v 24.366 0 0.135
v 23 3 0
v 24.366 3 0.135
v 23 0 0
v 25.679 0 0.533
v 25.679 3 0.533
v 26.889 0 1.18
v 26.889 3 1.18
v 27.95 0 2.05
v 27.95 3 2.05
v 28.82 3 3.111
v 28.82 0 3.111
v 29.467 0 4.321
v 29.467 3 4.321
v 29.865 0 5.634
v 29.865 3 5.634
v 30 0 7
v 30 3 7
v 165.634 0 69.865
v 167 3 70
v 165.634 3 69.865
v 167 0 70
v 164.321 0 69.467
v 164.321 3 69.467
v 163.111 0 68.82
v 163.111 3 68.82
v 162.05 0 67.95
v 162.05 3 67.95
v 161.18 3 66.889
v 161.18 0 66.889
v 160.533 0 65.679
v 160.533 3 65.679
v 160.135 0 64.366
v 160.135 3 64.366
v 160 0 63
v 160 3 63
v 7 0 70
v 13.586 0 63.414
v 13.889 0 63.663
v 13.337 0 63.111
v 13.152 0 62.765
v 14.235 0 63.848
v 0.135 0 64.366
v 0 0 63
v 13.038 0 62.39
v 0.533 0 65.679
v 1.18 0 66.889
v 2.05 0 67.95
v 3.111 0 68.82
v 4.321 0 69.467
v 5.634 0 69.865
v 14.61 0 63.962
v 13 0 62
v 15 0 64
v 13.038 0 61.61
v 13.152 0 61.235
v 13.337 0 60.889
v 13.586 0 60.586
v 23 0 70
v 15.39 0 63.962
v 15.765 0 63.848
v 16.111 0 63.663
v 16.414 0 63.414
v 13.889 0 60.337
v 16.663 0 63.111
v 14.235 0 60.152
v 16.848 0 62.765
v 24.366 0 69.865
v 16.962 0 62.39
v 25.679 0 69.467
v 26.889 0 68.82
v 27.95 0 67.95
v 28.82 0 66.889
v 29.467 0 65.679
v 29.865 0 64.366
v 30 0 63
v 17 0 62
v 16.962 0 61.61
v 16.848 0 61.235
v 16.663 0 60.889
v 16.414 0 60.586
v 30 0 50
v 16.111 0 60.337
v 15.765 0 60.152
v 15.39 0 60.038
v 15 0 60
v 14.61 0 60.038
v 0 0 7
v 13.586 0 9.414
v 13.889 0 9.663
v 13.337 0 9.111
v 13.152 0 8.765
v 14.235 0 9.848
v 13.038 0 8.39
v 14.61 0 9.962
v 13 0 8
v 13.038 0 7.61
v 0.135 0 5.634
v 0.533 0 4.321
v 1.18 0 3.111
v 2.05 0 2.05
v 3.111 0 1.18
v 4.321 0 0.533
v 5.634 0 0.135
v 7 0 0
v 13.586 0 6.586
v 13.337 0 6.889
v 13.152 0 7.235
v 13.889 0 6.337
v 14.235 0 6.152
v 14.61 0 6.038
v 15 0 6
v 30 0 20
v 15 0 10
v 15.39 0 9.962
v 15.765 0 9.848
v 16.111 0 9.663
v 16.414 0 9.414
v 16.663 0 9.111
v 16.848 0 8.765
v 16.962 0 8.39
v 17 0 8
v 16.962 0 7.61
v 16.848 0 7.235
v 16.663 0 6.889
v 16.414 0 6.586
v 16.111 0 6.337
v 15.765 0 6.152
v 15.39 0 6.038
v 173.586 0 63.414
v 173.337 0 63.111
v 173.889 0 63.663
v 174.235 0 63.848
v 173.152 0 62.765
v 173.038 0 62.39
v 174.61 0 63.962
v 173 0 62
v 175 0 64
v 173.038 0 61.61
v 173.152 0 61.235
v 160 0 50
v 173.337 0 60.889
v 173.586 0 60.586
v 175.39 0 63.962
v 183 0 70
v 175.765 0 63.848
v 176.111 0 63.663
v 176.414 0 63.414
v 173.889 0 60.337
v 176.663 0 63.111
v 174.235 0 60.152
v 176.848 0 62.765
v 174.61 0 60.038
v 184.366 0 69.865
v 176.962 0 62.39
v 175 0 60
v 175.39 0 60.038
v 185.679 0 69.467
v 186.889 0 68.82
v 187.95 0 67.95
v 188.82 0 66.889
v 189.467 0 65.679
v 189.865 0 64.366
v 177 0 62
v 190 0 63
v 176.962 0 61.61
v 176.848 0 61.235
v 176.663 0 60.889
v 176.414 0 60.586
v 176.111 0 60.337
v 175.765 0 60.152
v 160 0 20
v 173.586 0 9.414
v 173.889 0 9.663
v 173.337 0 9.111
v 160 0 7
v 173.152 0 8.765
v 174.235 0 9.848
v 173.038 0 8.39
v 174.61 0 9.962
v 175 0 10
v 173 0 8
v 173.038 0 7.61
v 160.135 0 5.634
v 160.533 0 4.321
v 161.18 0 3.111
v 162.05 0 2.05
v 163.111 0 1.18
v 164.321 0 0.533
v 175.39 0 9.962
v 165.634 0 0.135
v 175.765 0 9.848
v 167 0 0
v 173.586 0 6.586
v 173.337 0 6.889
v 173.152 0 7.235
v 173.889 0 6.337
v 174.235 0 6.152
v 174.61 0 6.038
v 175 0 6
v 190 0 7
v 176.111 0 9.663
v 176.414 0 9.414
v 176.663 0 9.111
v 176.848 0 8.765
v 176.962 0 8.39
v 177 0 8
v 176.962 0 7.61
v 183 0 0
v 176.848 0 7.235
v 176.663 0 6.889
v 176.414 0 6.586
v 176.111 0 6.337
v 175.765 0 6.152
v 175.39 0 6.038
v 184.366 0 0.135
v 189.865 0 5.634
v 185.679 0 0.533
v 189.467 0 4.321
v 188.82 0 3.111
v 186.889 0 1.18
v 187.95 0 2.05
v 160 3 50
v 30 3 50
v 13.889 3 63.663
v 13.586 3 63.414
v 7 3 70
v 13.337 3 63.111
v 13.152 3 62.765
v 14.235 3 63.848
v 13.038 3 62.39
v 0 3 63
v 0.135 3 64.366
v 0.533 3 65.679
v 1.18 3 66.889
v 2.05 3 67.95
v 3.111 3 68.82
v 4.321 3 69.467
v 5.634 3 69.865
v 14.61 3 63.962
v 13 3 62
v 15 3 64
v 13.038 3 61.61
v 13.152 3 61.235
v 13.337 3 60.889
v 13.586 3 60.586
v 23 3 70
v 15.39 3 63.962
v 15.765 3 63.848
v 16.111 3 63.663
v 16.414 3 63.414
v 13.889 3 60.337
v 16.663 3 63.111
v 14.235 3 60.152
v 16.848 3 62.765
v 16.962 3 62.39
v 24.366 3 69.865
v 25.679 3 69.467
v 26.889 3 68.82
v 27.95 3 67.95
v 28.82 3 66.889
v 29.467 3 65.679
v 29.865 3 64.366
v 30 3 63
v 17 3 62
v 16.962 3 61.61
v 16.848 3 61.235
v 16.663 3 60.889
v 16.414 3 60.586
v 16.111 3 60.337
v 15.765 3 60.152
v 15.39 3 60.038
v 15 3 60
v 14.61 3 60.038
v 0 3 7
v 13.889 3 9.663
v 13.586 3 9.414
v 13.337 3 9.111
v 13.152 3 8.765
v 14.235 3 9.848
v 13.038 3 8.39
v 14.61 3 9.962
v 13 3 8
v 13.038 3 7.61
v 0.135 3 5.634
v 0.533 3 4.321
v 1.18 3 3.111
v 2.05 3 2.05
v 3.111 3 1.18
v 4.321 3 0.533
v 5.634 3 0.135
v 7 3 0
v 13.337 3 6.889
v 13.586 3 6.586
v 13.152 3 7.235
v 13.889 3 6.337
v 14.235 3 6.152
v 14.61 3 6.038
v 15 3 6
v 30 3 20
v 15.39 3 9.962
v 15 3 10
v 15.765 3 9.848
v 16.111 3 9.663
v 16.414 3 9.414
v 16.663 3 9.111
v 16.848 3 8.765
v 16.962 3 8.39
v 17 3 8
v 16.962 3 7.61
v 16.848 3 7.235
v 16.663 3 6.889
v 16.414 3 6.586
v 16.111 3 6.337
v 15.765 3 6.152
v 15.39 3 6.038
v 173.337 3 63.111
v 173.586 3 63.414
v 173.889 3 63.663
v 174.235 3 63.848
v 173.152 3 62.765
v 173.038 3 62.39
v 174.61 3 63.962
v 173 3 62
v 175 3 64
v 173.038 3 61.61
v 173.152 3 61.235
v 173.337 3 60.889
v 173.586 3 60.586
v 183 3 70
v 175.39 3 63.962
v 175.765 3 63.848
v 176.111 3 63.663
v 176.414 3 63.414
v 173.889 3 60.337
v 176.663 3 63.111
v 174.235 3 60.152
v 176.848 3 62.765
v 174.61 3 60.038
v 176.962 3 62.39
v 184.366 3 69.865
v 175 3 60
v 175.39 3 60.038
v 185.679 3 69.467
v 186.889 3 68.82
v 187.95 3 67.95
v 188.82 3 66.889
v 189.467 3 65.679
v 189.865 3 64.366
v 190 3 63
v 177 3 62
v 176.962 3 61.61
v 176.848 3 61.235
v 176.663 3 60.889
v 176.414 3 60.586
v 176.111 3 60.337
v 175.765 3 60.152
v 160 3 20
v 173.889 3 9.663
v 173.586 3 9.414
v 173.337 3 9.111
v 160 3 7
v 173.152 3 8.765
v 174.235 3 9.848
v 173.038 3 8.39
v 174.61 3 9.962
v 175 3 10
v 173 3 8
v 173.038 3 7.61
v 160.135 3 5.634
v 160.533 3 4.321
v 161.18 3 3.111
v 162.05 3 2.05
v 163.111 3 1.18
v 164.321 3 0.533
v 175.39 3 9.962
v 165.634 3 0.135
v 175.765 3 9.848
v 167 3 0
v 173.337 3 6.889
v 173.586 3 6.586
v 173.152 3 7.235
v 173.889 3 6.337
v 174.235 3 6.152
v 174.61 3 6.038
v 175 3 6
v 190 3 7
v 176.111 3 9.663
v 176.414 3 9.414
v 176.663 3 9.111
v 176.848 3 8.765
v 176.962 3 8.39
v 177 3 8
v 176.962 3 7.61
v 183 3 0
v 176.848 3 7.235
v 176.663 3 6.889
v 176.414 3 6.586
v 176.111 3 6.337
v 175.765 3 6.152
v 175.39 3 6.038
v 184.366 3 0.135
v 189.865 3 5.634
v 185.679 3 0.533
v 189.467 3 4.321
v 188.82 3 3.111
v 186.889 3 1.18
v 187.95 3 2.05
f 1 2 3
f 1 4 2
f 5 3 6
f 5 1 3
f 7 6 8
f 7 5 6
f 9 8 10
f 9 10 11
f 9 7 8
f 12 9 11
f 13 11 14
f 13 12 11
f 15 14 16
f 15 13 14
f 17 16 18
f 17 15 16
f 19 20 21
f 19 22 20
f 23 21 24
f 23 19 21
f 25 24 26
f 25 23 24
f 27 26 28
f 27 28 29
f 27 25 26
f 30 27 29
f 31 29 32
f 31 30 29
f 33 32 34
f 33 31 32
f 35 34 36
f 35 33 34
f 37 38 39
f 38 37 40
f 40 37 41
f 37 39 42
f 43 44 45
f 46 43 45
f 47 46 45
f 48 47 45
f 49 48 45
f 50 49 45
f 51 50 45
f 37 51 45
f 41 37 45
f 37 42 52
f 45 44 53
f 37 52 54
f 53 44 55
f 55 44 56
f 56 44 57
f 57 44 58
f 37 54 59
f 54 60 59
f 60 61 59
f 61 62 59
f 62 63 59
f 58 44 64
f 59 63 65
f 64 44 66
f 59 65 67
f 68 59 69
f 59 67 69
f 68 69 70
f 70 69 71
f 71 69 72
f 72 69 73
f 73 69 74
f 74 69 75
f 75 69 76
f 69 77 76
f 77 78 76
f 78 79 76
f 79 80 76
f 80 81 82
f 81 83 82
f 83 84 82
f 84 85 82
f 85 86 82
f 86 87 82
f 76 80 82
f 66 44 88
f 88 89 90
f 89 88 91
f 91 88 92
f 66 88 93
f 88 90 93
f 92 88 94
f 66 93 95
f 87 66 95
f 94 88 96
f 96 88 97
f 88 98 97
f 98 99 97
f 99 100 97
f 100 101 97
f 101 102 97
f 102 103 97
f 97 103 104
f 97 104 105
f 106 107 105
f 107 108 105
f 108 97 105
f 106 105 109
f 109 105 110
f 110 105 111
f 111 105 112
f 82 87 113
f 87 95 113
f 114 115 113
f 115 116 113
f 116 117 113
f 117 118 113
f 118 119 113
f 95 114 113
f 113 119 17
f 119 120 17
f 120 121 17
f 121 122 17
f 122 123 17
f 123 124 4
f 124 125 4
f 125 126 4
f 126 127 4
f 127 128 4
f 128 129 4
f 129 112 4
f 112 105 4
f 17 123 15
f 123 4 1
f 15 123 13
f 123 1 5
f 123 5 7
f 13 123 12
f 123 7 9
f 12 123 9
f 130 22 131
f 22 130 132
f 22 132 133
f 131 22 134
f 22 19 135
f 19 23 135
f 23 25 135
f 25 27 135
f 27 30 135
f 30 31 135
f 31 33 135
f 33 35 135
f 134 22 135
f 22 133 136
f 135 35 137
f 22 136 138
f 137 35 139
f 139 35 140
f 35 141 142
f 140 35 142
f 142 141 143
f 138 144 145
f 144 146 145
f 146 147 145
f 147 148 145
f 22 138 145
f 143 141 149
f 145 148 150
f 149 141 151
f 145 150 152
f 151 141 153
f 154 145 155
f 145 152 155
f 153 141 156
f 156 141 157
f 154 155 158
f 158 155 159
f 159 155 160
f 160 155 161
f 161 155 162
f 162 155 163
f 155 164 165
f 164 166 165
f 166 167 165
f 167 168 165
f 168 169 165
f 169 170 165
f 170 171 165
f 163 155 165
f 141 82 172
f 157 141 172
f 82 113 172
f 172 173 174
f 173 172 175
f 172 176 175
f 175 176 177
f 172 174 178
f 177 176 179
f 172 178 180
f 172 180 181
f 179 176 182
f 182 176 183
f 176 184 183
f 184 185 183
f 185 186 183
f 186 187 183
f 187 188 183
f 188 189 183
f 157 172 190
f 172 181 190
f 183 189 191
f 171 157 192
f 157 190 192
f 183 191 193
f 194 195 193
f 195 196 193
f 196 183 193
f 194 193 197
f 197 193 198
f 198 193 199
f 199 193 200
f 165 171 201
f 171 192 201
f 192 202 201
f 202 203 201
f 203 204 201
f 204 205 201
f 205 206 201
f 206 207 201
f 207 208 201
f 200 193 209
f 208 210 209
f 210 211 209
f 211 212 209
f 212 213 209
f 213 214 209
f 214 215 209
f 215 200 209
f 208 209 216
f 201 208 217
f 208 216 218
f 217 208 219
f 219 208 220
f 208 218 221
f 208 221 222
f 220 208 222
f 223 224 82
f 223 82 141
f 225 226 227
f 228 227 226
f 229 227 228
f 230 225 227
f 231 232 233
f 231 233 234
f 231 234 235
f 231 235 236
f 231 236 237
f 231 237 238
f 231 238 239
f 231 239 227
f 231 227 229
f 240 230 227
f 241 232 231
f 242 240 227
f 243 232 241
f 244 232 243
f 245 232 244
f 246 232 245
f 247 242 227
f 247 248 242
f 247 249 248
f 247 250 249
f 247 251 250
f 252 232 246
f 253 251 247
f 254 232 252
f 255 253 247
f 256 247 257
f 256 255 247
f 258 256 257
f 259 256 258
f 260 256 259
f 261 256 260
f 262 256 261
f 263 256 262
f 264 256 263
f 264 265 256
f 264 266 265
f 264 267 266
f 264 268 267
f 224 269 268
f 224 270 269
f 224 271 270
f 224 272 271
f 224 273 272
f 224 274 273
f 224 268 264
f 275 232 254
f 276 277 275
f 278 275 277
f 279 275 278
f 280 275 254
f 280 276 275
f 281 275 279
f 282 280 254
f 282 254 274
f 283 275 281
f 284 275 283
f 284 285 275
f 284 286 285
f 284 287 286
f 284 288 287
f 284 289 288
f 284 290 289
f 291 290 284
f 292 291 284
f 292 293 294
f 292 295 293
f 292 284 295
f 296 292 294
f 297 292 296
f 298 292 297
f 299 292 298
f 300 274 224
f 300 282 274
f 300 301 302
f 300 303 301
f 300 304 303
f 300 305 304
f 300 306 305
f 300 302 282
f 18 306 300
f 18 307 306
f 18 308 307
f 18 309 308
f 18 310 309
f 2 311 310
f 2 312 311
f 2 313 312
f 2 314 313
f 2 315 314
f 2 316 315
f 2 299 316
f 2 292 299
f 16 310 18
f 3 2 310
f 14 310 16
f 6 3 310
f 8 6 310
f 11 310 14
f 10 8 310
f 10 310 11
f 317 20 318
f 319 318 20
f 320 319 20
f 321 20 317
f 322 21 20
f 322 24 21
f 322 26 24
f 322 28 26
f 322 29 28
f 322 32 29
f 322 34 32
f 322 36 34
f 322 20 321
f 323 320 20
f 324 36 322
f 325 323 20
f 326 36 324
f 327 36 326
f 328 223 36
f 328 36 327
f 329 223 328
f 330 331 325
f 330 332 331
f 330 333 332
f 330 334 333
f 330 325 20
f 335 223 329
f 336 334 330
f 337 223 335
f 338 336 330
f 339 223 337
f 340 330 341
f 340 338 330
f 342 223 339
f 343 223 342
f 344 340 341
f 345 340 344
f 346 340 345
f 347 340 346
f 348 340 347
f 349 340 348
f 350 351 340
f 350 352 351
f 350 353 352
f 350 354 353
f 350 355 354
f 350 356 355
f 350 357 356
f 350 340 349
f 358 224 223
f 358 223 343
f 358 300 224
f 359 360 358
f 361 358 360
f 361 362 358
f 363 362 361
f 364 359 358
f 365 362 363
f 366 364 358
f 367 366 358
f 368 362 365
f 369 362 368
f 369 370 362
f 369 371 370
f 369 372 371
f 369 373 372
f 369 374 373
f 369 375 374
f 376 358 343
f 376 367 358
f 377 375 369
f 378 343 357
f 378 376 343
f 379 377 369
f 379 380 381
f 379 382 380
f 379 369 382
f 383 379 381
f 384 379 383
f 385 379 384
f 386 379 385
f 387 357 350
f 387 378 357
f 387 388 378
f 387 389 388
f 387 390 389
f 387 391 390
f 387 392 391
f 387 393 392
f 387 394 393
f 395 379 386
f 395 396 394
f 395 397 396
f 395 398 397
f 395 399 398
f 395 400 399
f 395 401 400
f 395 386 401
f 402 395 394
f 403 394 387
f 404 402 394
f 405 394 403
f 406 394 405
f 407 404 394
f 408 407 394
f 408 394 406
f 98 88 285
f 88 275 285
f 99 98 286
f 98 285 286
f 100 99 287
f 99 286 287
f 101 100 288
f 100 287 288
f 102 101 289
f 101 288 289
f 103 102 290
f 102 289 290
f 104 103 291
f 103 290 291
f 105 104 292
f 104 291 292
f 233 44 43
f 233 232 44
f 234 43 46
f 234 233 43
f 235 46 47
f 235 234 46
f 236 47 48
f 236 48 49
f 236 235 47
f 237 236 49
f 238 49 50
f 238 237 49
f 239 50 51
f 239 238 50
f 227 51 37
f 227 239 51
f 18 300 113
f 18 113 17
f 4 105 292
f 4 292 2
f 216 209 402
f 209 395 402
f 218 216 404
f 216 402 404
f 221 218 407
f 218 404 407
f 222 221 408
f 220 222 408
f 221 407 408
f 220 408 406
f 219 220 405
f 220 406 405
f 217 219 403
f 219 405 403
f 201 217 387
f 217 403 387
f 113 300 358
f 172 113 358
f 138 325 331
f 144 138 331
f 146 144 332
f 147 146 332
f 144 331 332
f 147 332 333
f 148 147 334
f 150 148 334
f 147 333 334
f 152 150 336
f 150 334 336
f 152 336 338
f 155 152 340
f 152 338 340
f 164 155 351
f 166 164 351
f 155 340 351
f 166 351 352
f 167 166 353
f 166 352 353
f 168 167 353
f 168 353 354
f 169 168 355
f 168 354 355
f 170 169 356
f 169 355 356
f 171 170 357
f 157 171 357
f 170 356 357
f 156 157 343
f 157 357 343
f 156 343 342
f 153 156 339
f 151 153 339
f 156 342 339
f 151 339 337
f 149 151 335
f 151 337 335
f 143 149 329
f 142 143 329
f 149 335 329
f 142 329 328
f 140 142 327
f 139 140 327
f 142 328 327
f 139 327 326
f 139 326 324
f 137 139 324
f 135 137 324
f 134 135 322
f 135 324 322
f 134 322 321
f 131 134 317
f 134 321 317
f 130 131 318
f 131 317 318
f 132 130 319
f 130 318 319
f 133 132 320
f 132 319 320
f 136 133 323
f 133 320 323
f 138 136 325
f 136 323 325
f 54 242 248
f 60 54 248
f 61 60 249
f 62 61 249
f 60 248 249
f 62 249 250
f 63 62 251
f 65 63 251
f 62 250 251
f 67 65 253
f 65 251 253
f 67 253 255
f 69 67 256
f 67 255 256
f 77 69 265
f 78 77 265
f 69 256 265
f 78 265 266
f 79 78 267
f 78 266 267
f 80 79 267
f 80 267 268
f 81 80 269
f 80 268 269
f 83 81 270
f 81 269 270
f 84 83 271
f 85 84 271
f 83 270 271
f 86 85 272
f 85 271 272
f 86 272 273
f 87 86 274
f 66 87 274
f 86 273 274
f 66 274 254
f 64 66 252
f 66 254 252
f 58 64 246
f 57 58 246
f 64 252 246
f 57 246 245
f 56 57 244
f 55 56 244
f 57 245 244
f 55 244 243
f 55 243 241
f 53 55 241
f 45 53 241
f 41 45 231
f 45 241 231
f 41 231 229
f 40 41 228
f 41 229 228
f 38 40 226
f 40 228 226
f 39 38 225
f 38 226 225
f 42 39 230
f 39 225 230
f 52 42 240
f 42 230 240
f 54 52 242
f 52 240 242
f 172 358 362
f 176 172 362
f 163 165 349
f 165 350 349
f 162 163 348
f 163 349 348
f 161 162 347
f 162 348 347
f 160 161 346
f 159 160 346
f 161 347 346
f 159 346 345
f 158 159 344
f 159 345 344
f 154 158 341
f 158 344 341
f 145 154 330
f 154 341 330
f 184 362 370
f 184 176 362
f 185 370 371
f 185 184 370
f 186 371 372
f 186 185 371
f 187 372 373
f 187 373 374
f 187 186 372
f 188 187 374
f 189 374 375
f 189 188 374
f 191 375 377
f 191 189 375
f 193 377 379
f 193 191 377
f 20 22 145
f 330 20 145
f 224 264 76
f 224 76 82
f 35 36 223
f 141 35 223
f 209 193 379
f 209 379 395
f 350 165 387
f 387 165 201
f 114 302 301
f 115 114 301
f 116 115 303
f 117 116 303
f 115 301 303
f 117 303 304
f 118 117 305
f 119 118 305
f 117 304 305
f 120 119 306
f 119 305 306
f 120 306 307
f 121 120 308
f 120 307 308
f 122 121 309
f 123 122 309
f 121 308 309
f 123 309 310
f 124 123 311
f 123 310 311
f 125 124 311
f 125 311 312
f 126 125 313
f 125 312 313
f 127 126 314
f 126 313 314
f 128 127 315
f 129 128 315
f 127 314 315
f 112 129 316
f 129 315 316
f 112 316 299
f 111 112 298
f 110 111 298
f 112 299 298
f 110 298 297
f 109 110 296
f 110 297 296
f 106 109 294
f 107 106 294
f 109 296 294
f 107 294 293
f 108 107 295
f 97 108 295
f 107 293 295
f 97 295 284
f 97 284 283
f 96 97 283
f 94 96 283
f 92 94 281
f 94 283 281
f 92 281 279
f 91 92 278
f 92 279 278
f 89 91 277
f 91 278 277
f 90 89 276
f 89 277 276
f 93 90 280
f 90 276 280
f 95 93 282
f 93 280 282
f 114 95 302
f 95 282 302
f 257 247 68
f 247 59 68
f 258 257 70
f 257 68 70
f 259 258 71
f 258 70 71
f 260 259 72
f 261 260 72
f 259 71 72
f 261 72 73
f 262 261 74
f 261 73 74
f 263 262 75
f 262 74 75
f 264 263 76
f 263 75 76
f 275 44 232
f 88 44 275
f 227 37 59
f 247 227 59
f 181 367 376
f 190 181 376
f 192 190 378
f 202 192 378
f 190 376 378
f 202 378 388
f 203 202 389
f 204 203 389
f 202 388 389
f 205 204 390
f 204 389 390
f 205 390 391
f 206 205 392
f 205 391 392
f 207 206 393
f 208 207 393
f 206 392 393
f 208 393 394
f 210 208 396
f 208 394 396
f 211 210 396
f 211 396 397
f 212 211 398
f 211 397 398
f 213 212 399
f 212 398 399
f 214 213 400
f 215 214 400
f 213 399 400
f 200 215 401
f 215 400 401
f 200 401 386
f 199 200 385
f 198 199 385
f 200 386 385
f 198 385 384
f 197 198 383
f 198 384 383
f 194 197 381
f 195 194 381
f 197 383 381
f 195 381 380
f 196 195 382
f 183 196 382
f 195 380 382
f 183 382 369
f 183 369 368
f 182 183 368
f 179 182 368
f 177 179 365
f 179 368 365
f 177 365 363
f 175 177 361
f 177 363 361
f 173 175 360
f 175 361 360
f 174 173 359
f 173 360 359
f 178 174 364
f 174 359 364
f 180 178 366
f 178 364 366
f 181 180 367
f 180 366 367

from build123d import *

# Parameters (mm, degrees)
CROQUIS1_W              = 190
CROQUIS1_H              = 70
SALIENTE_EXTRUIR1_DEPTH = 3
CROQUIS2_R              = 2
CROQUIS2_W              = 130
CROQUIS2_H              = 20
CORTAR_EXTRUIR1_DEPTH   = 3
REDONDEO1_R             = 7


with BuildPart() as part:
    # Croquis1 → Saliente-Extruir1 (new body)
    with BuildSketch(Plane(origin=(0, 0, 0), x_dir=(1, 0, 0), z_dir=(0, 1, 0))):
        with Locations((95, -35)):
            Rectangle(CROQUIS1_W, CROQUIS1_H)
    extrude(amount=SALIENTE_EXTRUIR1_DEPTH)

    # Croquis2 → Cortar-Extruir1 (cut)
    with BuildSketch(Plane(origin=(0, 3, 0), x_dir=(1, 0, 0), z_dir=(0, 1, 0))):
        with Locations(Location((15, -8, 0), (0, 0, 270))):
            Circle(CROQUIS2_R)
        with Locations(Location((175, -8, 0), (0, 0, 270))):
            Circle(CROQUIS2_R)
        with Locations(Location((175, -62, 0), (0, 0, 270))):
            Circle(CROQUIS2_R)
        with Locations(Location((15, -62, 0), (0, 0, 270))):
            Circle(CROQUIS2_R)
        with Locations((95, -10)):
            Rectangle(CROQUIS2_W, CROQUIS2_H)
        with Locations((95, -60)):
            Rectangle(CROQUIS2_W, CROQUIS2_H)
    extrude(amount=-CORTAR_EXTRUIR1_DEPTH, mode=Mode.SUBTRACT)

    # Redondeo1
    redondeo1_edges = [part.edges().sort_by_distance(p)[0] for p in [
        (30, 1.5, 70),
        (160, 1.5, 70),
        (30, 1.5, 0),
        (160, 1.5, 0),
        (0, 1.5, 0),
        (190, 1.5, 0),
        (190, 1.5, 70),
        (0, 1.5, 70),
    ]]
    fillet(redondeo1_edges, radius=REDONDEO1_R)


solid = part.part
